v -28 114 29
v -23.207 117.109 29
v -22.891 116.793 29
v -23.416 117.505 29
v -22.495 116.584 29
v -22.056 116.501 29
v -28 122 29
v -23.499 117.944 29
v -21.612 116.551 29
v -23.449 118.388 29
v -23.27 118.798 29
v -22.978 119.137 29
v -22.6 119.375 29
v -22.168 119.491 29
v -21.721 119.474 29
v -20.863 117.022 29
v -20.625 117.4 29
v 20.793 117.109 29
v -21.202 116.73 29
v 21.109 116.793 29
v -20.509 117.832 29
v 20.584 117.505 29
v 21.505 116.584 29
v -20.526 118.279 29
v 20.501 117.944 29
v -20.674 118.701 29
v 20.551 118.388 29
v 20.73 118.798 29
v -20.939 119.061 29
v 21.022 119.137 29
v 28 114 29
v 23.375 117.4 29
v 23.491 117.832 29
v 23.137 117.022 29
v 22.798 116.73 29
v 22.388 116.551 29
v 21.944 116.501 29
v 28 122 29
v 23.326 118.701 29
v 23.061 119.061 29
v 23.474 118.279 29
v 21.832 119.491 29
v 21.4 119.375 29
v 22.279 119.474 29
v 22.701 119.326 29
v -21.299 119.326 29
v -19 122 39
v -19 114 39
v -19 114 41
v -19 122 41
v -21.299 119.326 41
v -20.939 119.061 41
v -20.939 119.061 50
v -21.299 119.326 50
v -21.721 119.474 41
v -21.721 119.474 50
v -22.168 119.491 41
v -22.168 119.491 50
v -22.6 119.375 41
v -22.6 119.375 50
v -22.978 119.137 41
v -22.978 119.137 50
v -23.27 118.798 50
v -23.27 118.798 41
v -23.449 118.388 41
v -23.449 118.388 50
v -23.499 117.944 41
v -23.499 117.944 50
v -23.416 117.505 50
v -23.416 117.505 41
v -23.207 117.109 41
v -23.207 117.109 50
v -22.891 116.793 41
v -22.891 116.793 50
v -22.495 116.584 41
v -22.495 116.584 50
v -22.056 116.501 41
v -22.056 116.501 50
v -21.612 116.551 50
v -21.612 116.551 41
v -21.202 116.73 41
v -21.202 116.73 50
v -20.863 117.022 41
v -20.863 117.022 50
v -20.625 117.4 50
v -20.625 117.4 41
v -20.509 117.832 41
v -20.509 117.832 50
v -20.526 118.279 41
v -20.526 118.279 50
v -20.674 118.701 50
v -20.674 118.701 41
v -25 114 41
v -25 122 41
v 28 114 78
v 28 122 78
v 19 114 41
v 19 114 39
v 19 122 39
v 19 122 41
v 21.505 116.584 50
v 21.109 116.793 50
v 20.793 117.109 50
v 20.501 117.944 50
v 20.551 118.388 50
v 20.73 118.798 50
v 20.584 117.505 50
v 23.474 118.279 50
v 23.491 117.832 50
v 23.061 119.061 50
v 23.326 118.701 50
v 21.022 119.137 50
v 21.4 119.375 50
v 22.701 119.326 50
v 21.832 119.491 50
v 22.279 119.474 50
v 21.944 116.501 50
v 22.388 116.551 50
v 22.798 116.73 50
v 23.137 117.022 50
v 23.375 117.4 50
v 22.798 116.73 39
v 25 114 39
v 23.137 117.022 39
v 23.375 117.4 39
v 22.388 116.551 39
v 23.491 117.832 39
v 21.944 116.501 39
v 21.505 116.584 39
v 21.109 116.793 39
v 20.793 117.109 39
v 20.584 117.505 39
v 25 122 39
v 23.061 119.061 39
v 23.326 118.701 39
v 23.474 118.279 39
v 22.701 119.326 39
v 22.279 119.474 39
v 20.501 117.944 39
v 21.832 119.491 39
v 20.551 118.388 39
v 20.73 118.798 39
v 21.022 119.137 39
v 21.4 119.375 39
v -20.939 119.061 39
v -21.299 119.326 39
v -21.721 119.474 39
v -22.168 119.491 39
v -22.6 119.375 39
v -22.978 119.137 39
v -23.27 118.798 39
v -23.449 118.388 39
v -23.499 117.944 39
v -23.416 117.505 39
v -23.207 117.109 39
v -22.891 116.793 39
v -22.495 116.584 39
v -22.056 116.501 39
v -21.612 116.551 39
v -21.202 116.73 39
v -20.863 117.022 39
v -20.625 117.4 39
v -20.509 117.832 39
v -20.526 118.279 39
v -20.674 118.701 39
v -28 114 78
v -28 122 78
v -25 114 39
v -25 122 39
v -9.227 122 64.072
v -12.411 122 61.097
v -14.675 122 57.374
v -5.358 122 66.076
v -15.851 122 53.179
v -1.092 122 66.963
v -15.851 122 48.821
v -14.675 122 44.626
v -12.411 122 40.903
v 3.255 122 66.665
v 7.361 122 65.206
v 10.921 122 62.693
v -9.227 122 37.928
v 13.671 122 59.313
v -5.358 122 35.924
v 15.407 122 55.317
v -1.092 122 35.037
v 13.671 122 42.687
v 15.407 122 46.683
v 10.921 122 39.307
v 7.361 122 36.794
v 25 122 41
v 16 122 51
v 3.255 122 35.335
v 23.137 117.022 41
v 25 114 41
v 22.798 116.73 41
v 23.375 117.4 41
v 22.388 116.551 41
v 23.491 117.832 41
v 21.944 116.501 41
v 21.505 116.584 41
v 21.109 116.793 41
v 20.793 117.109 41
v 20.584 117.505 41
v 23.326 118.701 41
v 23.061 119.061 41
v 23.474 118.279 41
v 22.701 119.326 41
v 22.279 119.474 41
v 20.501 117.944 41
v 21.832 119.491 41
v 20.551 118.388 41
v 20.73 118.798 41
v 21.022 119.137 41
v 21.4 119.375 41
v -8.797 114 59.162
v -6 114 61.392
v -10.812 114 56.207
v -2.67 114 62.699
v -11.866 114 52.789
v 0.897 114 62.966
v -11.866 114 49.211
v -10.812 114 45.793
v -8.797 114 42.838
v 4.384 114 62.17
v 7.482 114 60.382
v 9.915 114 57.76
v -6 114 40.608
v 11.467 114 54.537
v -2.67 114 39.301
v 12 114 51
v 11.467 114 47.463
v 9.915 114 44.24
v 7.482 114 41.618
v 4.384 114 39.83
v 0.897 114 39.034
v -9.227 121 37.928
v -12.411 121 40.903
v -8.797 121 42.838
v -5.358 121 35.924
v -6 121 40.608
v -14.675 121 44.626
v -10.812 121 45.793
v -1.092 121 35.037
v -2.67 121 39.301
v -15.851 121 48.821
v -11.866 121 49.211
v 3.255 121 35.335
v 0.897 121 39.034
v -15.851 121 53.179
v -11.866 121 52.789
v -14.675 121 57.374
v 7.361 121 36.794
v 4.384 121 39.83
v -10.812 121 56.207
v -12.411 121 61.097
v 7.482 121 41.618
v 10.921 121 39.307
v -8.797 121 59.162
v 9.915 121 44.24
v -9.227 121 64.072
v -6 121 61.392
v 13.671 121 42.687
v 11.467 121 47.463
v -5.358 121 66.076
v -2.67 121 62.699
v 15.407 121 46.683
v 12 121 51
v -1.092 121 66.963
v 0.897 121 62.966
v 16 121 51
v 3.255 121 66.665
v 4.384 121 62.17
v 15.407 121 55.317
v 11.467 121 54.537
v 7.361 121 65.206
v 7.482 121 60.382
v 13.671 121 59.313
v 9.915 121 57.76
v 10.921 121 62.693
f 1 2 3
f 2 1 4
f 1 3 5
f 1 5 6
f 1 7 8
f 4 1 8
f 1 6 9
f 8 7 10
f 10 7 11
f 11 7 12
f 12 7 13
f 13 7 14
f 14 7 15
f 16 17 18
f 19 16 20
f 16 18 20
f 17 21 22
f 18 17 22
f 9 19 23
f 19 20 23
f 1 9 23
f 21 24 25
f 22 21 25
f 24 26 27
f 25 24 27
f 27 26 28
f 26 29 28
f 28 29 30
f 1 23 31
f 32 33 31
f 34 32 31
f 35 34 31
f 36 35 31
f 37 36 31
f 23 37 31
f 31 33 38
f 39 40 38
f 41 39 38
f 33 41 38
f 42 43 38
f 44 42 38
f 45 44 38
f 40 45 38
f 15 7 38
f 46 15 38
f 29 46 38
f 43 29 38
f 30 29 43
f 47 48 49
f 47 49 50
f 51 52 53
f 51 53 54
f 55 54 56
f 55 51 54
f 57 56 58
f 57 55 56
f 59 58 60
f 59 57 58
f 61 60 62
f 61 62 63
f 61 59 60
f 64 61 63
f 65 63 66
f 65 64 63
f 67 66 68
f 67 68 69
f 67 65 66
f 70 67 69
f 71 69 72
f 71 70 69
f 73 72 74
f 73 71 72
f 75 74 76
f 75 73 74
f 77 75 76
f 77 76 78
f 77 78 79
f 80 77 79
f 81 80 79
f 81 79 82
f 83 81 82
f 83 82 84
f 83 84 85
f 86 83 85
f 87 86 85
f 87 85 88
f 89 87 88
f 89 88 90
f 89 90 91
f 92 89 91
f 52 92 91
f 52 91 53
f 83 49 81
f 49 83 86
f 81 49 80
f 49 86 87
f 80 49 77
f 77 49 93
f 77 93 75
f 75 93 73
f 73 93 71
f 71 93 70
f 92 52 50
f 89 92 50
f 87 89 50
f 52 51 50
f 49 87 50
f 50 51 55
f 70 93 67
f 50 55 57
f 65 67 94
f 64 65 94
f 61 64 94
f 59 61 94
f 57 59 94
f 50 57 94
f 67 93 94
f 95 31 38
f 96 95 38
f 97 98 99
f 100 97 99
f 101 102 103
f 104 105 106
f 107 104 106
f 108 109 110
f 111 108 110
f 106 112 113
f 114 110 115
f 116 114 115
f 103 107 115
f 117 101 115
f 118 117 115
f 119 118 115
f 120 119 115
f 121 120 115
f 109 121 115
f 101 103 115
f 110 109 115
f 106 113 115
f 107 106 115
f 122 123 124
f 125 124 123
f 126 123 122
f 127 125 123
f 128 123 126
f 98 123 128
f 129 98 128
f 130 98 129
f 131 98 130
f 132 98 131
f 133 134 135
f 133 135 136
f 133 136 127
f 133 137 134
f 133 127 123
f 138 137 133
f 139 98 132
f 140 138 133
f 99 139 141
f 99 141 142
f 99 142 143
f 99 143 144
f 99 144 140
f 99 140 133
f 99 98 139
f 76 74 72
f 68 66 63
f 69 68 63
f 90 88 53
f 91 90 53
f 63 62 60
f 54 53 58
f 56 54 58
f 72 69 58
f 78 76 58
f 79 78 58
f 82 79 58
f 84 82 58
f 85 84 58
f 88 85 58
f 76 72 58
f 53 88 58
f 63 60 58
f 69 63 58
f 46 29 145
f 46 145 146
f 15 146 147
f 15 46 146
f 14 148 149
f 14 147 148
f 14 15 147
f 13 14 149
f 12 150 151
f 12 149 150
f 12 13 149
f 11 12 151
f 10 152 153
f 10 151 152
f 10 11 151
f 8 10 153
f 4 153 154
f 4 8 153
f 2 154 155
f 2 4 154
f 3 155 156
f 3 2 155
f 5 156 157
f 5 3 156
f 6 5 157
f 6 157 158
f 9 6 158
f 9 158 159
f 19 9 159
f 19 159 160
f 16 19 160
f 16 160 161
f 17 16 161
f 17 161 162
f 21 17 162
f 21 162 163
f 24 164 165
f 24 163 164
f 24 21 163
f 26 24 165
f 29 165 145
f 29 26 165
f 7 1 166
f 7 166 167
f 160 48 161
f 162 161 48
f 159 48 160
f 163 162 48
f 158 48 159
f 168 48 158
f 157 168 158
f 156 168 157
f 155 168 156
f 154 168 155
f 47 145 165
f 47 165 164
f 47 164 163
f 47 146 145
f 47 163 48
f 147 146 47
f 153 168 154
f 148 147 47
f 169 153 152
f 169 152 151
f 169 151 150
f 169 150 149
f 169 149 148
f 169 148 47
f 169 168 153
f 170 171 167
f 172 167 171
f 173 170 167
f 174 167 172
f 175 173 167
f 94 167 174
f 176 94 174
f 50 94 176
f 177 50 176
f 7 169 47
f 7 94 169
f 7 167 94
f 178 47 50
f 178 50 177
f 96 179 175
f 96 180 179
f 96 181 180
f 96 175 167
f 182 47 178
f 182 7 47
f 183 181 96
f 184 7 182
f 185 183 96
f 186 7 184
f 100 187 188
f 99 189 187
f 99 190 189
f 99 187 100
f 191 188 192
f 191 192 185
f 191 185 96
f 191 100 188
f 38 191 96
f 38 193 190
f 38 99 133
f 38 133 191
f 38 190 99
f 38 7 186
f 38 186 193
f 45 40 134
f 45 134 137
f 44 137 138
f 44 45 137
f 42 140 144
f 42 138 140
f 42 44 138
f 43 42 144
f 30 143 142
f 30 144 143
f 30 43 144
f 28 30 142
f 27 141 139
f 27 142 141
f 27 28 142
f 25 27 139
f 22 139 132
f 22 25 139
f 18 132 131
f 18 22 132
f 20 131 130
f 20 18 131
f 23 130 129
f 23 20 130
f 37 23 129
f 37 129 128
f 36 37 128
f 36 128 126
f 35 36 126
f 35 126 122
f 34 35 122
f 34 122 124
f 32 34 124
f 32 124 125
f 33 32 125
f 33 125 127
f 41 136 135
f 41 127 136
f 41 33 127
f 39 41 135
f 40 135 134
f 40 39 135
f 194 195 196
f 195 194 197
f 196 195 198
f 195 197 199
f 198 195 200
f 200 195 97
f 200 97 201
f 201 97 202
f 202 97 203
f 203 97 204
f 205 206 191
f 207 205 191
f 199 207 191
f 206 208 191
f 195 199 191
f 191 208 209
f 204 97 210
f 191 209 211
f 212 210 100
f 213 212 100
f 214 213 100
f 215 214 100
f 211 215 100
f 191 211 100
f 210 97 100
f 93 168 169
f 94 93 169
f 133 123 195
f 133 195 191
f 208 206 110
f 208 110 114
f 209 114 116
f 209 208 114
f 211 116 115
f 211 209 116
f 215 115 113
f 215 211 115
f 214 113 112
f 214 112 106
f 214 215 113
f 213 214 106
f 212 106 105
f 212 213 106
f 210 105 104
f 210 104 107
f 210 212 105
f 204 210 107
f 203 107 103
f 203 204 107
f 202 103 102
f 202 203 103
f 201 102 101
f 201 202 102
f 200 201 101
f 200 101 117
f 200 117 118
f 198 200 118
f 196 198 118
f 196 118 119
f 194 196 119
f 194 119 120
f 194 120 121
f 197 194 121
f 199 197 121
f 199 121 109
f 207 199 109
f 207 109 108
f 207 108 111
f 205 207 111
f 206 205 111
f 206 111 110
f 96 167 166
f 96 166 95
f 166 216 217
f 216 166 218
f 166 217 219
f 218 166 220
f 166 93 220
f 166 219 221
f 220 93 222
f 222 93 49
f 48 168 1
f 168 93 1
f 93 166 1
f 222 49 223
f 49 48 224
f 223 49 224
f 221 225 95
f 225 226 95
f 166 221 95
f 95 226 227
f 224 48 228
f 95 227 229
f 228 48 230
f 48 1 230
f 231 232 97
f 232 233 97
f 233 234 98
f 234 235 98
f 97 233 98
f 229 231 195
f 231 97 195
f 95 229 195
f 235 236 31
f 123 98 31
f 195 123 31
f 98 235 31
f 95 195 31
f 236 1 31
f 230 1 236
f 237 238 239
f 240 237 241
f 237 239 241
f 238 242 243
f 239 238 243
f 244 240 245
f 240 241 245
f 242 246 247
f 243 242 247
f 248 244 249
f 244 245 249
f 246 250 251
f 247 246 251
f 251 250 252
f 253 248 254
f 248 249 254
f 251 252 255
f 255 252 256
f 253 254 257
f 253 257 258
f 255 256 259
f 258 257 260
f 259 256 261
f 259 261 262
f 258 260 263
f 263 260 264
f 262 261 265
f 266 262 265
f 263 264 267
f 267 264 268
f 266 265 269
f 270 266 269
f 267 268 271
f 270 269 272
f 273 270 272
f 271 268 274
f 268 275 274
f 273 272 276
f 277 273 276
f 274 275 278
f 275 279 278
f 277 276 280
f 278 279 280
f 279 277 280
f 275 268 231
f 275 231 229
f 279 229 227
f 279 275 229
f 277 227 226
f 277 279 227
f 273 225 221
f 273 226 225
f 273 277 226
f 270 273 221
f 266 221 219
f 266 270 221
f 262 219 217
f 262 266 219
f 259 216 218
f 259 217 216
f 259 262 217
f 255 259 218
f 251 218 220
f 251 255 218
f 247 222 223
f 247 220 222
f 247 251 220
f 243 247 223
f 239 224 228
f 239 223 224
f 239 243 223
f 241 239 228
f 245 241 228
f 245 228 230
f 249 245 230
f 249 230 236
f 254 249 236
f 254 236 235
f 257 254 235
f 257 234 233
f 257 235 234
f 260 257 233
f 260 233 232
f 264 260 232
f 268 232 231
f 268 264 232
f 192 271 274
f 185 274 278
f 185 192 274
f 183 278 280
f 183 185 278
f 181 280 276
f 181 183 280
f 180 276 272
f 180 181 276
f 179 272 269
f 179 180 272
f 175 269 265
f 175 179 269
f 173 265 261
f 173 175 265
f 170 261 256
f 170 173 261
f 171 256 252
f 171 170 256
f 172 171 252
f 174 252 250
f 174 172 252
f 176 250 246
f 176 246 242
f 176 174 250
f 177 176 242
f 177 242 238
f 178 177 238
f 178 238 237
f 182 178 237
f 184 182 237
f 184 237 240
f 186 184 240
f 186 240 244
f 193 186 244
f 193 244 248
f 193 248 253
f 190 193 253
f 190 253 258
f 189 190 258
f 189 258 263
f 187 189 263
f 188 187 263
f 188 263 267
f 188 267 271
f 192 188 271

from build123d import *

# Parameters (mm, degrees)
TUBE044_R                    = 16
TUBE044_R_2                  = 8.5
TUBE044_DEPTH                = 10
CYLINDER1883_R               = 1.5
CYLINDER1883_DEPTH           = 50
CYLINDER1883_PLACEMENT_ANGLE = 45
CYLINDER1884_R               = 1.5
CYLINDER1884_DEPTH           = 50
CYLINDER1884_PLACEMENT_ANGLE = 45
BOX792_W                     = 8
BOX792_H                     = 6
BOX792_DEPTH                 = 2
BOX793_W                     = 8
BOX793_H                     = 6
BOX793_DEPTH                 = 2
CYLINDER1878_R               = 12
CYLINDER1878_DEPTH           = 20
BOX787_W                     = 56
BOX787_H                     = 8
BOX787_DEPTH                 = 49


with BuildPart() as f_6003_2rs004:
    # Tube044 → Tube044 (new body)
    with BuildSketch(Plane(origin=(0, 131, 51), x_dir=(1, 0, 0), z_dir=(0, -1, 0))):
        Circle(TUBE044_R)
        Circle(TUBE044_R_2, mode=Mode.SUBTRACT)
    extrude(amount=TUBE044_DEPTH)


with BuildPart() as v_lec1883:
    # Cylinder1883 → Cylinder1883 (new body)
    with BuildSketch(Plane.XY):
        Circle(CYLINDER1883_R)
    extrude(amount=CYLINDER1883_DEPTH)


with BuildPart() as v_lec1883_1:
    # Cylinder1883 placement: moved
    add(v_lec1883.part.moved(Location((22, 118, 0))).rotate(Axis((22, 118, 0), (0, 0, 1)), CYLINDER1883_PLACEMENT_ANGLE))


with BuildPart() as compound947:
    # Cylinder1884 → Cylinder1884 (new body)
    with BuildSketch(Plane.XY):
        Circle(CYLINDER1884_R)
    extrude(amount=CYLINDER1884_DEPTH)


with BuildPart() as compound947_1:
    # Cylinder1884 placement: moved
    add(compound947.part.moved(Location((-22, 118, 0))).rotate(Axis((-22, 118, 0), (0, 0, 1)), CYLINDER1884_PLACEMENT_ANGLE))

    # Compound947: union Válec1883
    add(v_lec1883_1.part)


with BuildPart() as krychle792:
    # Box792 → Box792 (new body)
    with BuildSketch(Plane(origin=(-19, 114, 39), x_dir=(0, 1, 0), z_dir=(0, 0, 1))):
        with Locations((4, 3)):
            Rectangle(BOX792_W, BOX792_H)
    extrude(amount=BOX792_DEPTH)


with BuildPart() as compound946:
    # Box793 → Box793 (new body)
    with BuildSketch(Plane(origin=(25, 114, 39), x_dir=(0, 1, 0), z_dir=(0, 0, 1))):
        with Locations((4, 3)):
            Rectangle(BOX793_W, BOX793_H)
    extrude(amount=BOX793_DEPTH)

    # Compound946: union Krychle792
    add(krychle792.part)


with BuildPart() as v_lec1878:
    # Cylinder1878 → Cylinder1878 (new body)
    with BuildSketch(Plane(origin=(0, 124, 51), x_dir=(1, 0, 0), z_dir=(0, -1, 0))):
        Circle(CYLINDER1878_R)
    extrude(amount=CYLINDER1878_DEPTH)


with BuildPart() as cut598:
    # Box787 → Box787 (new body)
    with BuildSketch(Plane(origin=(-28, 114, 29), x_dir=(1, 0, 0), z_dir=(0, 0, 1))):
        with Locations((28, 4)):
            Rectangle(BOX787_W, BOX787_H)
    extrude(amount=BOX787_DEPTH)

    # Cut591: cut Válec1878
    add(v_lec1878.part, mode=Mode.SUBTRACT)

    # Cut592: cut Compound946
    add(compound946.part, mode=Mode.SUBTRACT)

    # Cut593: cut Compound947
    add(compound947_1.part, mode=Mode.SUBTRACT)

    # Cut598: cut 6003-2RS004
    add(f_6003_2rs004.part, mode=Mode.SUBTRACT)


solid = cut598.part
